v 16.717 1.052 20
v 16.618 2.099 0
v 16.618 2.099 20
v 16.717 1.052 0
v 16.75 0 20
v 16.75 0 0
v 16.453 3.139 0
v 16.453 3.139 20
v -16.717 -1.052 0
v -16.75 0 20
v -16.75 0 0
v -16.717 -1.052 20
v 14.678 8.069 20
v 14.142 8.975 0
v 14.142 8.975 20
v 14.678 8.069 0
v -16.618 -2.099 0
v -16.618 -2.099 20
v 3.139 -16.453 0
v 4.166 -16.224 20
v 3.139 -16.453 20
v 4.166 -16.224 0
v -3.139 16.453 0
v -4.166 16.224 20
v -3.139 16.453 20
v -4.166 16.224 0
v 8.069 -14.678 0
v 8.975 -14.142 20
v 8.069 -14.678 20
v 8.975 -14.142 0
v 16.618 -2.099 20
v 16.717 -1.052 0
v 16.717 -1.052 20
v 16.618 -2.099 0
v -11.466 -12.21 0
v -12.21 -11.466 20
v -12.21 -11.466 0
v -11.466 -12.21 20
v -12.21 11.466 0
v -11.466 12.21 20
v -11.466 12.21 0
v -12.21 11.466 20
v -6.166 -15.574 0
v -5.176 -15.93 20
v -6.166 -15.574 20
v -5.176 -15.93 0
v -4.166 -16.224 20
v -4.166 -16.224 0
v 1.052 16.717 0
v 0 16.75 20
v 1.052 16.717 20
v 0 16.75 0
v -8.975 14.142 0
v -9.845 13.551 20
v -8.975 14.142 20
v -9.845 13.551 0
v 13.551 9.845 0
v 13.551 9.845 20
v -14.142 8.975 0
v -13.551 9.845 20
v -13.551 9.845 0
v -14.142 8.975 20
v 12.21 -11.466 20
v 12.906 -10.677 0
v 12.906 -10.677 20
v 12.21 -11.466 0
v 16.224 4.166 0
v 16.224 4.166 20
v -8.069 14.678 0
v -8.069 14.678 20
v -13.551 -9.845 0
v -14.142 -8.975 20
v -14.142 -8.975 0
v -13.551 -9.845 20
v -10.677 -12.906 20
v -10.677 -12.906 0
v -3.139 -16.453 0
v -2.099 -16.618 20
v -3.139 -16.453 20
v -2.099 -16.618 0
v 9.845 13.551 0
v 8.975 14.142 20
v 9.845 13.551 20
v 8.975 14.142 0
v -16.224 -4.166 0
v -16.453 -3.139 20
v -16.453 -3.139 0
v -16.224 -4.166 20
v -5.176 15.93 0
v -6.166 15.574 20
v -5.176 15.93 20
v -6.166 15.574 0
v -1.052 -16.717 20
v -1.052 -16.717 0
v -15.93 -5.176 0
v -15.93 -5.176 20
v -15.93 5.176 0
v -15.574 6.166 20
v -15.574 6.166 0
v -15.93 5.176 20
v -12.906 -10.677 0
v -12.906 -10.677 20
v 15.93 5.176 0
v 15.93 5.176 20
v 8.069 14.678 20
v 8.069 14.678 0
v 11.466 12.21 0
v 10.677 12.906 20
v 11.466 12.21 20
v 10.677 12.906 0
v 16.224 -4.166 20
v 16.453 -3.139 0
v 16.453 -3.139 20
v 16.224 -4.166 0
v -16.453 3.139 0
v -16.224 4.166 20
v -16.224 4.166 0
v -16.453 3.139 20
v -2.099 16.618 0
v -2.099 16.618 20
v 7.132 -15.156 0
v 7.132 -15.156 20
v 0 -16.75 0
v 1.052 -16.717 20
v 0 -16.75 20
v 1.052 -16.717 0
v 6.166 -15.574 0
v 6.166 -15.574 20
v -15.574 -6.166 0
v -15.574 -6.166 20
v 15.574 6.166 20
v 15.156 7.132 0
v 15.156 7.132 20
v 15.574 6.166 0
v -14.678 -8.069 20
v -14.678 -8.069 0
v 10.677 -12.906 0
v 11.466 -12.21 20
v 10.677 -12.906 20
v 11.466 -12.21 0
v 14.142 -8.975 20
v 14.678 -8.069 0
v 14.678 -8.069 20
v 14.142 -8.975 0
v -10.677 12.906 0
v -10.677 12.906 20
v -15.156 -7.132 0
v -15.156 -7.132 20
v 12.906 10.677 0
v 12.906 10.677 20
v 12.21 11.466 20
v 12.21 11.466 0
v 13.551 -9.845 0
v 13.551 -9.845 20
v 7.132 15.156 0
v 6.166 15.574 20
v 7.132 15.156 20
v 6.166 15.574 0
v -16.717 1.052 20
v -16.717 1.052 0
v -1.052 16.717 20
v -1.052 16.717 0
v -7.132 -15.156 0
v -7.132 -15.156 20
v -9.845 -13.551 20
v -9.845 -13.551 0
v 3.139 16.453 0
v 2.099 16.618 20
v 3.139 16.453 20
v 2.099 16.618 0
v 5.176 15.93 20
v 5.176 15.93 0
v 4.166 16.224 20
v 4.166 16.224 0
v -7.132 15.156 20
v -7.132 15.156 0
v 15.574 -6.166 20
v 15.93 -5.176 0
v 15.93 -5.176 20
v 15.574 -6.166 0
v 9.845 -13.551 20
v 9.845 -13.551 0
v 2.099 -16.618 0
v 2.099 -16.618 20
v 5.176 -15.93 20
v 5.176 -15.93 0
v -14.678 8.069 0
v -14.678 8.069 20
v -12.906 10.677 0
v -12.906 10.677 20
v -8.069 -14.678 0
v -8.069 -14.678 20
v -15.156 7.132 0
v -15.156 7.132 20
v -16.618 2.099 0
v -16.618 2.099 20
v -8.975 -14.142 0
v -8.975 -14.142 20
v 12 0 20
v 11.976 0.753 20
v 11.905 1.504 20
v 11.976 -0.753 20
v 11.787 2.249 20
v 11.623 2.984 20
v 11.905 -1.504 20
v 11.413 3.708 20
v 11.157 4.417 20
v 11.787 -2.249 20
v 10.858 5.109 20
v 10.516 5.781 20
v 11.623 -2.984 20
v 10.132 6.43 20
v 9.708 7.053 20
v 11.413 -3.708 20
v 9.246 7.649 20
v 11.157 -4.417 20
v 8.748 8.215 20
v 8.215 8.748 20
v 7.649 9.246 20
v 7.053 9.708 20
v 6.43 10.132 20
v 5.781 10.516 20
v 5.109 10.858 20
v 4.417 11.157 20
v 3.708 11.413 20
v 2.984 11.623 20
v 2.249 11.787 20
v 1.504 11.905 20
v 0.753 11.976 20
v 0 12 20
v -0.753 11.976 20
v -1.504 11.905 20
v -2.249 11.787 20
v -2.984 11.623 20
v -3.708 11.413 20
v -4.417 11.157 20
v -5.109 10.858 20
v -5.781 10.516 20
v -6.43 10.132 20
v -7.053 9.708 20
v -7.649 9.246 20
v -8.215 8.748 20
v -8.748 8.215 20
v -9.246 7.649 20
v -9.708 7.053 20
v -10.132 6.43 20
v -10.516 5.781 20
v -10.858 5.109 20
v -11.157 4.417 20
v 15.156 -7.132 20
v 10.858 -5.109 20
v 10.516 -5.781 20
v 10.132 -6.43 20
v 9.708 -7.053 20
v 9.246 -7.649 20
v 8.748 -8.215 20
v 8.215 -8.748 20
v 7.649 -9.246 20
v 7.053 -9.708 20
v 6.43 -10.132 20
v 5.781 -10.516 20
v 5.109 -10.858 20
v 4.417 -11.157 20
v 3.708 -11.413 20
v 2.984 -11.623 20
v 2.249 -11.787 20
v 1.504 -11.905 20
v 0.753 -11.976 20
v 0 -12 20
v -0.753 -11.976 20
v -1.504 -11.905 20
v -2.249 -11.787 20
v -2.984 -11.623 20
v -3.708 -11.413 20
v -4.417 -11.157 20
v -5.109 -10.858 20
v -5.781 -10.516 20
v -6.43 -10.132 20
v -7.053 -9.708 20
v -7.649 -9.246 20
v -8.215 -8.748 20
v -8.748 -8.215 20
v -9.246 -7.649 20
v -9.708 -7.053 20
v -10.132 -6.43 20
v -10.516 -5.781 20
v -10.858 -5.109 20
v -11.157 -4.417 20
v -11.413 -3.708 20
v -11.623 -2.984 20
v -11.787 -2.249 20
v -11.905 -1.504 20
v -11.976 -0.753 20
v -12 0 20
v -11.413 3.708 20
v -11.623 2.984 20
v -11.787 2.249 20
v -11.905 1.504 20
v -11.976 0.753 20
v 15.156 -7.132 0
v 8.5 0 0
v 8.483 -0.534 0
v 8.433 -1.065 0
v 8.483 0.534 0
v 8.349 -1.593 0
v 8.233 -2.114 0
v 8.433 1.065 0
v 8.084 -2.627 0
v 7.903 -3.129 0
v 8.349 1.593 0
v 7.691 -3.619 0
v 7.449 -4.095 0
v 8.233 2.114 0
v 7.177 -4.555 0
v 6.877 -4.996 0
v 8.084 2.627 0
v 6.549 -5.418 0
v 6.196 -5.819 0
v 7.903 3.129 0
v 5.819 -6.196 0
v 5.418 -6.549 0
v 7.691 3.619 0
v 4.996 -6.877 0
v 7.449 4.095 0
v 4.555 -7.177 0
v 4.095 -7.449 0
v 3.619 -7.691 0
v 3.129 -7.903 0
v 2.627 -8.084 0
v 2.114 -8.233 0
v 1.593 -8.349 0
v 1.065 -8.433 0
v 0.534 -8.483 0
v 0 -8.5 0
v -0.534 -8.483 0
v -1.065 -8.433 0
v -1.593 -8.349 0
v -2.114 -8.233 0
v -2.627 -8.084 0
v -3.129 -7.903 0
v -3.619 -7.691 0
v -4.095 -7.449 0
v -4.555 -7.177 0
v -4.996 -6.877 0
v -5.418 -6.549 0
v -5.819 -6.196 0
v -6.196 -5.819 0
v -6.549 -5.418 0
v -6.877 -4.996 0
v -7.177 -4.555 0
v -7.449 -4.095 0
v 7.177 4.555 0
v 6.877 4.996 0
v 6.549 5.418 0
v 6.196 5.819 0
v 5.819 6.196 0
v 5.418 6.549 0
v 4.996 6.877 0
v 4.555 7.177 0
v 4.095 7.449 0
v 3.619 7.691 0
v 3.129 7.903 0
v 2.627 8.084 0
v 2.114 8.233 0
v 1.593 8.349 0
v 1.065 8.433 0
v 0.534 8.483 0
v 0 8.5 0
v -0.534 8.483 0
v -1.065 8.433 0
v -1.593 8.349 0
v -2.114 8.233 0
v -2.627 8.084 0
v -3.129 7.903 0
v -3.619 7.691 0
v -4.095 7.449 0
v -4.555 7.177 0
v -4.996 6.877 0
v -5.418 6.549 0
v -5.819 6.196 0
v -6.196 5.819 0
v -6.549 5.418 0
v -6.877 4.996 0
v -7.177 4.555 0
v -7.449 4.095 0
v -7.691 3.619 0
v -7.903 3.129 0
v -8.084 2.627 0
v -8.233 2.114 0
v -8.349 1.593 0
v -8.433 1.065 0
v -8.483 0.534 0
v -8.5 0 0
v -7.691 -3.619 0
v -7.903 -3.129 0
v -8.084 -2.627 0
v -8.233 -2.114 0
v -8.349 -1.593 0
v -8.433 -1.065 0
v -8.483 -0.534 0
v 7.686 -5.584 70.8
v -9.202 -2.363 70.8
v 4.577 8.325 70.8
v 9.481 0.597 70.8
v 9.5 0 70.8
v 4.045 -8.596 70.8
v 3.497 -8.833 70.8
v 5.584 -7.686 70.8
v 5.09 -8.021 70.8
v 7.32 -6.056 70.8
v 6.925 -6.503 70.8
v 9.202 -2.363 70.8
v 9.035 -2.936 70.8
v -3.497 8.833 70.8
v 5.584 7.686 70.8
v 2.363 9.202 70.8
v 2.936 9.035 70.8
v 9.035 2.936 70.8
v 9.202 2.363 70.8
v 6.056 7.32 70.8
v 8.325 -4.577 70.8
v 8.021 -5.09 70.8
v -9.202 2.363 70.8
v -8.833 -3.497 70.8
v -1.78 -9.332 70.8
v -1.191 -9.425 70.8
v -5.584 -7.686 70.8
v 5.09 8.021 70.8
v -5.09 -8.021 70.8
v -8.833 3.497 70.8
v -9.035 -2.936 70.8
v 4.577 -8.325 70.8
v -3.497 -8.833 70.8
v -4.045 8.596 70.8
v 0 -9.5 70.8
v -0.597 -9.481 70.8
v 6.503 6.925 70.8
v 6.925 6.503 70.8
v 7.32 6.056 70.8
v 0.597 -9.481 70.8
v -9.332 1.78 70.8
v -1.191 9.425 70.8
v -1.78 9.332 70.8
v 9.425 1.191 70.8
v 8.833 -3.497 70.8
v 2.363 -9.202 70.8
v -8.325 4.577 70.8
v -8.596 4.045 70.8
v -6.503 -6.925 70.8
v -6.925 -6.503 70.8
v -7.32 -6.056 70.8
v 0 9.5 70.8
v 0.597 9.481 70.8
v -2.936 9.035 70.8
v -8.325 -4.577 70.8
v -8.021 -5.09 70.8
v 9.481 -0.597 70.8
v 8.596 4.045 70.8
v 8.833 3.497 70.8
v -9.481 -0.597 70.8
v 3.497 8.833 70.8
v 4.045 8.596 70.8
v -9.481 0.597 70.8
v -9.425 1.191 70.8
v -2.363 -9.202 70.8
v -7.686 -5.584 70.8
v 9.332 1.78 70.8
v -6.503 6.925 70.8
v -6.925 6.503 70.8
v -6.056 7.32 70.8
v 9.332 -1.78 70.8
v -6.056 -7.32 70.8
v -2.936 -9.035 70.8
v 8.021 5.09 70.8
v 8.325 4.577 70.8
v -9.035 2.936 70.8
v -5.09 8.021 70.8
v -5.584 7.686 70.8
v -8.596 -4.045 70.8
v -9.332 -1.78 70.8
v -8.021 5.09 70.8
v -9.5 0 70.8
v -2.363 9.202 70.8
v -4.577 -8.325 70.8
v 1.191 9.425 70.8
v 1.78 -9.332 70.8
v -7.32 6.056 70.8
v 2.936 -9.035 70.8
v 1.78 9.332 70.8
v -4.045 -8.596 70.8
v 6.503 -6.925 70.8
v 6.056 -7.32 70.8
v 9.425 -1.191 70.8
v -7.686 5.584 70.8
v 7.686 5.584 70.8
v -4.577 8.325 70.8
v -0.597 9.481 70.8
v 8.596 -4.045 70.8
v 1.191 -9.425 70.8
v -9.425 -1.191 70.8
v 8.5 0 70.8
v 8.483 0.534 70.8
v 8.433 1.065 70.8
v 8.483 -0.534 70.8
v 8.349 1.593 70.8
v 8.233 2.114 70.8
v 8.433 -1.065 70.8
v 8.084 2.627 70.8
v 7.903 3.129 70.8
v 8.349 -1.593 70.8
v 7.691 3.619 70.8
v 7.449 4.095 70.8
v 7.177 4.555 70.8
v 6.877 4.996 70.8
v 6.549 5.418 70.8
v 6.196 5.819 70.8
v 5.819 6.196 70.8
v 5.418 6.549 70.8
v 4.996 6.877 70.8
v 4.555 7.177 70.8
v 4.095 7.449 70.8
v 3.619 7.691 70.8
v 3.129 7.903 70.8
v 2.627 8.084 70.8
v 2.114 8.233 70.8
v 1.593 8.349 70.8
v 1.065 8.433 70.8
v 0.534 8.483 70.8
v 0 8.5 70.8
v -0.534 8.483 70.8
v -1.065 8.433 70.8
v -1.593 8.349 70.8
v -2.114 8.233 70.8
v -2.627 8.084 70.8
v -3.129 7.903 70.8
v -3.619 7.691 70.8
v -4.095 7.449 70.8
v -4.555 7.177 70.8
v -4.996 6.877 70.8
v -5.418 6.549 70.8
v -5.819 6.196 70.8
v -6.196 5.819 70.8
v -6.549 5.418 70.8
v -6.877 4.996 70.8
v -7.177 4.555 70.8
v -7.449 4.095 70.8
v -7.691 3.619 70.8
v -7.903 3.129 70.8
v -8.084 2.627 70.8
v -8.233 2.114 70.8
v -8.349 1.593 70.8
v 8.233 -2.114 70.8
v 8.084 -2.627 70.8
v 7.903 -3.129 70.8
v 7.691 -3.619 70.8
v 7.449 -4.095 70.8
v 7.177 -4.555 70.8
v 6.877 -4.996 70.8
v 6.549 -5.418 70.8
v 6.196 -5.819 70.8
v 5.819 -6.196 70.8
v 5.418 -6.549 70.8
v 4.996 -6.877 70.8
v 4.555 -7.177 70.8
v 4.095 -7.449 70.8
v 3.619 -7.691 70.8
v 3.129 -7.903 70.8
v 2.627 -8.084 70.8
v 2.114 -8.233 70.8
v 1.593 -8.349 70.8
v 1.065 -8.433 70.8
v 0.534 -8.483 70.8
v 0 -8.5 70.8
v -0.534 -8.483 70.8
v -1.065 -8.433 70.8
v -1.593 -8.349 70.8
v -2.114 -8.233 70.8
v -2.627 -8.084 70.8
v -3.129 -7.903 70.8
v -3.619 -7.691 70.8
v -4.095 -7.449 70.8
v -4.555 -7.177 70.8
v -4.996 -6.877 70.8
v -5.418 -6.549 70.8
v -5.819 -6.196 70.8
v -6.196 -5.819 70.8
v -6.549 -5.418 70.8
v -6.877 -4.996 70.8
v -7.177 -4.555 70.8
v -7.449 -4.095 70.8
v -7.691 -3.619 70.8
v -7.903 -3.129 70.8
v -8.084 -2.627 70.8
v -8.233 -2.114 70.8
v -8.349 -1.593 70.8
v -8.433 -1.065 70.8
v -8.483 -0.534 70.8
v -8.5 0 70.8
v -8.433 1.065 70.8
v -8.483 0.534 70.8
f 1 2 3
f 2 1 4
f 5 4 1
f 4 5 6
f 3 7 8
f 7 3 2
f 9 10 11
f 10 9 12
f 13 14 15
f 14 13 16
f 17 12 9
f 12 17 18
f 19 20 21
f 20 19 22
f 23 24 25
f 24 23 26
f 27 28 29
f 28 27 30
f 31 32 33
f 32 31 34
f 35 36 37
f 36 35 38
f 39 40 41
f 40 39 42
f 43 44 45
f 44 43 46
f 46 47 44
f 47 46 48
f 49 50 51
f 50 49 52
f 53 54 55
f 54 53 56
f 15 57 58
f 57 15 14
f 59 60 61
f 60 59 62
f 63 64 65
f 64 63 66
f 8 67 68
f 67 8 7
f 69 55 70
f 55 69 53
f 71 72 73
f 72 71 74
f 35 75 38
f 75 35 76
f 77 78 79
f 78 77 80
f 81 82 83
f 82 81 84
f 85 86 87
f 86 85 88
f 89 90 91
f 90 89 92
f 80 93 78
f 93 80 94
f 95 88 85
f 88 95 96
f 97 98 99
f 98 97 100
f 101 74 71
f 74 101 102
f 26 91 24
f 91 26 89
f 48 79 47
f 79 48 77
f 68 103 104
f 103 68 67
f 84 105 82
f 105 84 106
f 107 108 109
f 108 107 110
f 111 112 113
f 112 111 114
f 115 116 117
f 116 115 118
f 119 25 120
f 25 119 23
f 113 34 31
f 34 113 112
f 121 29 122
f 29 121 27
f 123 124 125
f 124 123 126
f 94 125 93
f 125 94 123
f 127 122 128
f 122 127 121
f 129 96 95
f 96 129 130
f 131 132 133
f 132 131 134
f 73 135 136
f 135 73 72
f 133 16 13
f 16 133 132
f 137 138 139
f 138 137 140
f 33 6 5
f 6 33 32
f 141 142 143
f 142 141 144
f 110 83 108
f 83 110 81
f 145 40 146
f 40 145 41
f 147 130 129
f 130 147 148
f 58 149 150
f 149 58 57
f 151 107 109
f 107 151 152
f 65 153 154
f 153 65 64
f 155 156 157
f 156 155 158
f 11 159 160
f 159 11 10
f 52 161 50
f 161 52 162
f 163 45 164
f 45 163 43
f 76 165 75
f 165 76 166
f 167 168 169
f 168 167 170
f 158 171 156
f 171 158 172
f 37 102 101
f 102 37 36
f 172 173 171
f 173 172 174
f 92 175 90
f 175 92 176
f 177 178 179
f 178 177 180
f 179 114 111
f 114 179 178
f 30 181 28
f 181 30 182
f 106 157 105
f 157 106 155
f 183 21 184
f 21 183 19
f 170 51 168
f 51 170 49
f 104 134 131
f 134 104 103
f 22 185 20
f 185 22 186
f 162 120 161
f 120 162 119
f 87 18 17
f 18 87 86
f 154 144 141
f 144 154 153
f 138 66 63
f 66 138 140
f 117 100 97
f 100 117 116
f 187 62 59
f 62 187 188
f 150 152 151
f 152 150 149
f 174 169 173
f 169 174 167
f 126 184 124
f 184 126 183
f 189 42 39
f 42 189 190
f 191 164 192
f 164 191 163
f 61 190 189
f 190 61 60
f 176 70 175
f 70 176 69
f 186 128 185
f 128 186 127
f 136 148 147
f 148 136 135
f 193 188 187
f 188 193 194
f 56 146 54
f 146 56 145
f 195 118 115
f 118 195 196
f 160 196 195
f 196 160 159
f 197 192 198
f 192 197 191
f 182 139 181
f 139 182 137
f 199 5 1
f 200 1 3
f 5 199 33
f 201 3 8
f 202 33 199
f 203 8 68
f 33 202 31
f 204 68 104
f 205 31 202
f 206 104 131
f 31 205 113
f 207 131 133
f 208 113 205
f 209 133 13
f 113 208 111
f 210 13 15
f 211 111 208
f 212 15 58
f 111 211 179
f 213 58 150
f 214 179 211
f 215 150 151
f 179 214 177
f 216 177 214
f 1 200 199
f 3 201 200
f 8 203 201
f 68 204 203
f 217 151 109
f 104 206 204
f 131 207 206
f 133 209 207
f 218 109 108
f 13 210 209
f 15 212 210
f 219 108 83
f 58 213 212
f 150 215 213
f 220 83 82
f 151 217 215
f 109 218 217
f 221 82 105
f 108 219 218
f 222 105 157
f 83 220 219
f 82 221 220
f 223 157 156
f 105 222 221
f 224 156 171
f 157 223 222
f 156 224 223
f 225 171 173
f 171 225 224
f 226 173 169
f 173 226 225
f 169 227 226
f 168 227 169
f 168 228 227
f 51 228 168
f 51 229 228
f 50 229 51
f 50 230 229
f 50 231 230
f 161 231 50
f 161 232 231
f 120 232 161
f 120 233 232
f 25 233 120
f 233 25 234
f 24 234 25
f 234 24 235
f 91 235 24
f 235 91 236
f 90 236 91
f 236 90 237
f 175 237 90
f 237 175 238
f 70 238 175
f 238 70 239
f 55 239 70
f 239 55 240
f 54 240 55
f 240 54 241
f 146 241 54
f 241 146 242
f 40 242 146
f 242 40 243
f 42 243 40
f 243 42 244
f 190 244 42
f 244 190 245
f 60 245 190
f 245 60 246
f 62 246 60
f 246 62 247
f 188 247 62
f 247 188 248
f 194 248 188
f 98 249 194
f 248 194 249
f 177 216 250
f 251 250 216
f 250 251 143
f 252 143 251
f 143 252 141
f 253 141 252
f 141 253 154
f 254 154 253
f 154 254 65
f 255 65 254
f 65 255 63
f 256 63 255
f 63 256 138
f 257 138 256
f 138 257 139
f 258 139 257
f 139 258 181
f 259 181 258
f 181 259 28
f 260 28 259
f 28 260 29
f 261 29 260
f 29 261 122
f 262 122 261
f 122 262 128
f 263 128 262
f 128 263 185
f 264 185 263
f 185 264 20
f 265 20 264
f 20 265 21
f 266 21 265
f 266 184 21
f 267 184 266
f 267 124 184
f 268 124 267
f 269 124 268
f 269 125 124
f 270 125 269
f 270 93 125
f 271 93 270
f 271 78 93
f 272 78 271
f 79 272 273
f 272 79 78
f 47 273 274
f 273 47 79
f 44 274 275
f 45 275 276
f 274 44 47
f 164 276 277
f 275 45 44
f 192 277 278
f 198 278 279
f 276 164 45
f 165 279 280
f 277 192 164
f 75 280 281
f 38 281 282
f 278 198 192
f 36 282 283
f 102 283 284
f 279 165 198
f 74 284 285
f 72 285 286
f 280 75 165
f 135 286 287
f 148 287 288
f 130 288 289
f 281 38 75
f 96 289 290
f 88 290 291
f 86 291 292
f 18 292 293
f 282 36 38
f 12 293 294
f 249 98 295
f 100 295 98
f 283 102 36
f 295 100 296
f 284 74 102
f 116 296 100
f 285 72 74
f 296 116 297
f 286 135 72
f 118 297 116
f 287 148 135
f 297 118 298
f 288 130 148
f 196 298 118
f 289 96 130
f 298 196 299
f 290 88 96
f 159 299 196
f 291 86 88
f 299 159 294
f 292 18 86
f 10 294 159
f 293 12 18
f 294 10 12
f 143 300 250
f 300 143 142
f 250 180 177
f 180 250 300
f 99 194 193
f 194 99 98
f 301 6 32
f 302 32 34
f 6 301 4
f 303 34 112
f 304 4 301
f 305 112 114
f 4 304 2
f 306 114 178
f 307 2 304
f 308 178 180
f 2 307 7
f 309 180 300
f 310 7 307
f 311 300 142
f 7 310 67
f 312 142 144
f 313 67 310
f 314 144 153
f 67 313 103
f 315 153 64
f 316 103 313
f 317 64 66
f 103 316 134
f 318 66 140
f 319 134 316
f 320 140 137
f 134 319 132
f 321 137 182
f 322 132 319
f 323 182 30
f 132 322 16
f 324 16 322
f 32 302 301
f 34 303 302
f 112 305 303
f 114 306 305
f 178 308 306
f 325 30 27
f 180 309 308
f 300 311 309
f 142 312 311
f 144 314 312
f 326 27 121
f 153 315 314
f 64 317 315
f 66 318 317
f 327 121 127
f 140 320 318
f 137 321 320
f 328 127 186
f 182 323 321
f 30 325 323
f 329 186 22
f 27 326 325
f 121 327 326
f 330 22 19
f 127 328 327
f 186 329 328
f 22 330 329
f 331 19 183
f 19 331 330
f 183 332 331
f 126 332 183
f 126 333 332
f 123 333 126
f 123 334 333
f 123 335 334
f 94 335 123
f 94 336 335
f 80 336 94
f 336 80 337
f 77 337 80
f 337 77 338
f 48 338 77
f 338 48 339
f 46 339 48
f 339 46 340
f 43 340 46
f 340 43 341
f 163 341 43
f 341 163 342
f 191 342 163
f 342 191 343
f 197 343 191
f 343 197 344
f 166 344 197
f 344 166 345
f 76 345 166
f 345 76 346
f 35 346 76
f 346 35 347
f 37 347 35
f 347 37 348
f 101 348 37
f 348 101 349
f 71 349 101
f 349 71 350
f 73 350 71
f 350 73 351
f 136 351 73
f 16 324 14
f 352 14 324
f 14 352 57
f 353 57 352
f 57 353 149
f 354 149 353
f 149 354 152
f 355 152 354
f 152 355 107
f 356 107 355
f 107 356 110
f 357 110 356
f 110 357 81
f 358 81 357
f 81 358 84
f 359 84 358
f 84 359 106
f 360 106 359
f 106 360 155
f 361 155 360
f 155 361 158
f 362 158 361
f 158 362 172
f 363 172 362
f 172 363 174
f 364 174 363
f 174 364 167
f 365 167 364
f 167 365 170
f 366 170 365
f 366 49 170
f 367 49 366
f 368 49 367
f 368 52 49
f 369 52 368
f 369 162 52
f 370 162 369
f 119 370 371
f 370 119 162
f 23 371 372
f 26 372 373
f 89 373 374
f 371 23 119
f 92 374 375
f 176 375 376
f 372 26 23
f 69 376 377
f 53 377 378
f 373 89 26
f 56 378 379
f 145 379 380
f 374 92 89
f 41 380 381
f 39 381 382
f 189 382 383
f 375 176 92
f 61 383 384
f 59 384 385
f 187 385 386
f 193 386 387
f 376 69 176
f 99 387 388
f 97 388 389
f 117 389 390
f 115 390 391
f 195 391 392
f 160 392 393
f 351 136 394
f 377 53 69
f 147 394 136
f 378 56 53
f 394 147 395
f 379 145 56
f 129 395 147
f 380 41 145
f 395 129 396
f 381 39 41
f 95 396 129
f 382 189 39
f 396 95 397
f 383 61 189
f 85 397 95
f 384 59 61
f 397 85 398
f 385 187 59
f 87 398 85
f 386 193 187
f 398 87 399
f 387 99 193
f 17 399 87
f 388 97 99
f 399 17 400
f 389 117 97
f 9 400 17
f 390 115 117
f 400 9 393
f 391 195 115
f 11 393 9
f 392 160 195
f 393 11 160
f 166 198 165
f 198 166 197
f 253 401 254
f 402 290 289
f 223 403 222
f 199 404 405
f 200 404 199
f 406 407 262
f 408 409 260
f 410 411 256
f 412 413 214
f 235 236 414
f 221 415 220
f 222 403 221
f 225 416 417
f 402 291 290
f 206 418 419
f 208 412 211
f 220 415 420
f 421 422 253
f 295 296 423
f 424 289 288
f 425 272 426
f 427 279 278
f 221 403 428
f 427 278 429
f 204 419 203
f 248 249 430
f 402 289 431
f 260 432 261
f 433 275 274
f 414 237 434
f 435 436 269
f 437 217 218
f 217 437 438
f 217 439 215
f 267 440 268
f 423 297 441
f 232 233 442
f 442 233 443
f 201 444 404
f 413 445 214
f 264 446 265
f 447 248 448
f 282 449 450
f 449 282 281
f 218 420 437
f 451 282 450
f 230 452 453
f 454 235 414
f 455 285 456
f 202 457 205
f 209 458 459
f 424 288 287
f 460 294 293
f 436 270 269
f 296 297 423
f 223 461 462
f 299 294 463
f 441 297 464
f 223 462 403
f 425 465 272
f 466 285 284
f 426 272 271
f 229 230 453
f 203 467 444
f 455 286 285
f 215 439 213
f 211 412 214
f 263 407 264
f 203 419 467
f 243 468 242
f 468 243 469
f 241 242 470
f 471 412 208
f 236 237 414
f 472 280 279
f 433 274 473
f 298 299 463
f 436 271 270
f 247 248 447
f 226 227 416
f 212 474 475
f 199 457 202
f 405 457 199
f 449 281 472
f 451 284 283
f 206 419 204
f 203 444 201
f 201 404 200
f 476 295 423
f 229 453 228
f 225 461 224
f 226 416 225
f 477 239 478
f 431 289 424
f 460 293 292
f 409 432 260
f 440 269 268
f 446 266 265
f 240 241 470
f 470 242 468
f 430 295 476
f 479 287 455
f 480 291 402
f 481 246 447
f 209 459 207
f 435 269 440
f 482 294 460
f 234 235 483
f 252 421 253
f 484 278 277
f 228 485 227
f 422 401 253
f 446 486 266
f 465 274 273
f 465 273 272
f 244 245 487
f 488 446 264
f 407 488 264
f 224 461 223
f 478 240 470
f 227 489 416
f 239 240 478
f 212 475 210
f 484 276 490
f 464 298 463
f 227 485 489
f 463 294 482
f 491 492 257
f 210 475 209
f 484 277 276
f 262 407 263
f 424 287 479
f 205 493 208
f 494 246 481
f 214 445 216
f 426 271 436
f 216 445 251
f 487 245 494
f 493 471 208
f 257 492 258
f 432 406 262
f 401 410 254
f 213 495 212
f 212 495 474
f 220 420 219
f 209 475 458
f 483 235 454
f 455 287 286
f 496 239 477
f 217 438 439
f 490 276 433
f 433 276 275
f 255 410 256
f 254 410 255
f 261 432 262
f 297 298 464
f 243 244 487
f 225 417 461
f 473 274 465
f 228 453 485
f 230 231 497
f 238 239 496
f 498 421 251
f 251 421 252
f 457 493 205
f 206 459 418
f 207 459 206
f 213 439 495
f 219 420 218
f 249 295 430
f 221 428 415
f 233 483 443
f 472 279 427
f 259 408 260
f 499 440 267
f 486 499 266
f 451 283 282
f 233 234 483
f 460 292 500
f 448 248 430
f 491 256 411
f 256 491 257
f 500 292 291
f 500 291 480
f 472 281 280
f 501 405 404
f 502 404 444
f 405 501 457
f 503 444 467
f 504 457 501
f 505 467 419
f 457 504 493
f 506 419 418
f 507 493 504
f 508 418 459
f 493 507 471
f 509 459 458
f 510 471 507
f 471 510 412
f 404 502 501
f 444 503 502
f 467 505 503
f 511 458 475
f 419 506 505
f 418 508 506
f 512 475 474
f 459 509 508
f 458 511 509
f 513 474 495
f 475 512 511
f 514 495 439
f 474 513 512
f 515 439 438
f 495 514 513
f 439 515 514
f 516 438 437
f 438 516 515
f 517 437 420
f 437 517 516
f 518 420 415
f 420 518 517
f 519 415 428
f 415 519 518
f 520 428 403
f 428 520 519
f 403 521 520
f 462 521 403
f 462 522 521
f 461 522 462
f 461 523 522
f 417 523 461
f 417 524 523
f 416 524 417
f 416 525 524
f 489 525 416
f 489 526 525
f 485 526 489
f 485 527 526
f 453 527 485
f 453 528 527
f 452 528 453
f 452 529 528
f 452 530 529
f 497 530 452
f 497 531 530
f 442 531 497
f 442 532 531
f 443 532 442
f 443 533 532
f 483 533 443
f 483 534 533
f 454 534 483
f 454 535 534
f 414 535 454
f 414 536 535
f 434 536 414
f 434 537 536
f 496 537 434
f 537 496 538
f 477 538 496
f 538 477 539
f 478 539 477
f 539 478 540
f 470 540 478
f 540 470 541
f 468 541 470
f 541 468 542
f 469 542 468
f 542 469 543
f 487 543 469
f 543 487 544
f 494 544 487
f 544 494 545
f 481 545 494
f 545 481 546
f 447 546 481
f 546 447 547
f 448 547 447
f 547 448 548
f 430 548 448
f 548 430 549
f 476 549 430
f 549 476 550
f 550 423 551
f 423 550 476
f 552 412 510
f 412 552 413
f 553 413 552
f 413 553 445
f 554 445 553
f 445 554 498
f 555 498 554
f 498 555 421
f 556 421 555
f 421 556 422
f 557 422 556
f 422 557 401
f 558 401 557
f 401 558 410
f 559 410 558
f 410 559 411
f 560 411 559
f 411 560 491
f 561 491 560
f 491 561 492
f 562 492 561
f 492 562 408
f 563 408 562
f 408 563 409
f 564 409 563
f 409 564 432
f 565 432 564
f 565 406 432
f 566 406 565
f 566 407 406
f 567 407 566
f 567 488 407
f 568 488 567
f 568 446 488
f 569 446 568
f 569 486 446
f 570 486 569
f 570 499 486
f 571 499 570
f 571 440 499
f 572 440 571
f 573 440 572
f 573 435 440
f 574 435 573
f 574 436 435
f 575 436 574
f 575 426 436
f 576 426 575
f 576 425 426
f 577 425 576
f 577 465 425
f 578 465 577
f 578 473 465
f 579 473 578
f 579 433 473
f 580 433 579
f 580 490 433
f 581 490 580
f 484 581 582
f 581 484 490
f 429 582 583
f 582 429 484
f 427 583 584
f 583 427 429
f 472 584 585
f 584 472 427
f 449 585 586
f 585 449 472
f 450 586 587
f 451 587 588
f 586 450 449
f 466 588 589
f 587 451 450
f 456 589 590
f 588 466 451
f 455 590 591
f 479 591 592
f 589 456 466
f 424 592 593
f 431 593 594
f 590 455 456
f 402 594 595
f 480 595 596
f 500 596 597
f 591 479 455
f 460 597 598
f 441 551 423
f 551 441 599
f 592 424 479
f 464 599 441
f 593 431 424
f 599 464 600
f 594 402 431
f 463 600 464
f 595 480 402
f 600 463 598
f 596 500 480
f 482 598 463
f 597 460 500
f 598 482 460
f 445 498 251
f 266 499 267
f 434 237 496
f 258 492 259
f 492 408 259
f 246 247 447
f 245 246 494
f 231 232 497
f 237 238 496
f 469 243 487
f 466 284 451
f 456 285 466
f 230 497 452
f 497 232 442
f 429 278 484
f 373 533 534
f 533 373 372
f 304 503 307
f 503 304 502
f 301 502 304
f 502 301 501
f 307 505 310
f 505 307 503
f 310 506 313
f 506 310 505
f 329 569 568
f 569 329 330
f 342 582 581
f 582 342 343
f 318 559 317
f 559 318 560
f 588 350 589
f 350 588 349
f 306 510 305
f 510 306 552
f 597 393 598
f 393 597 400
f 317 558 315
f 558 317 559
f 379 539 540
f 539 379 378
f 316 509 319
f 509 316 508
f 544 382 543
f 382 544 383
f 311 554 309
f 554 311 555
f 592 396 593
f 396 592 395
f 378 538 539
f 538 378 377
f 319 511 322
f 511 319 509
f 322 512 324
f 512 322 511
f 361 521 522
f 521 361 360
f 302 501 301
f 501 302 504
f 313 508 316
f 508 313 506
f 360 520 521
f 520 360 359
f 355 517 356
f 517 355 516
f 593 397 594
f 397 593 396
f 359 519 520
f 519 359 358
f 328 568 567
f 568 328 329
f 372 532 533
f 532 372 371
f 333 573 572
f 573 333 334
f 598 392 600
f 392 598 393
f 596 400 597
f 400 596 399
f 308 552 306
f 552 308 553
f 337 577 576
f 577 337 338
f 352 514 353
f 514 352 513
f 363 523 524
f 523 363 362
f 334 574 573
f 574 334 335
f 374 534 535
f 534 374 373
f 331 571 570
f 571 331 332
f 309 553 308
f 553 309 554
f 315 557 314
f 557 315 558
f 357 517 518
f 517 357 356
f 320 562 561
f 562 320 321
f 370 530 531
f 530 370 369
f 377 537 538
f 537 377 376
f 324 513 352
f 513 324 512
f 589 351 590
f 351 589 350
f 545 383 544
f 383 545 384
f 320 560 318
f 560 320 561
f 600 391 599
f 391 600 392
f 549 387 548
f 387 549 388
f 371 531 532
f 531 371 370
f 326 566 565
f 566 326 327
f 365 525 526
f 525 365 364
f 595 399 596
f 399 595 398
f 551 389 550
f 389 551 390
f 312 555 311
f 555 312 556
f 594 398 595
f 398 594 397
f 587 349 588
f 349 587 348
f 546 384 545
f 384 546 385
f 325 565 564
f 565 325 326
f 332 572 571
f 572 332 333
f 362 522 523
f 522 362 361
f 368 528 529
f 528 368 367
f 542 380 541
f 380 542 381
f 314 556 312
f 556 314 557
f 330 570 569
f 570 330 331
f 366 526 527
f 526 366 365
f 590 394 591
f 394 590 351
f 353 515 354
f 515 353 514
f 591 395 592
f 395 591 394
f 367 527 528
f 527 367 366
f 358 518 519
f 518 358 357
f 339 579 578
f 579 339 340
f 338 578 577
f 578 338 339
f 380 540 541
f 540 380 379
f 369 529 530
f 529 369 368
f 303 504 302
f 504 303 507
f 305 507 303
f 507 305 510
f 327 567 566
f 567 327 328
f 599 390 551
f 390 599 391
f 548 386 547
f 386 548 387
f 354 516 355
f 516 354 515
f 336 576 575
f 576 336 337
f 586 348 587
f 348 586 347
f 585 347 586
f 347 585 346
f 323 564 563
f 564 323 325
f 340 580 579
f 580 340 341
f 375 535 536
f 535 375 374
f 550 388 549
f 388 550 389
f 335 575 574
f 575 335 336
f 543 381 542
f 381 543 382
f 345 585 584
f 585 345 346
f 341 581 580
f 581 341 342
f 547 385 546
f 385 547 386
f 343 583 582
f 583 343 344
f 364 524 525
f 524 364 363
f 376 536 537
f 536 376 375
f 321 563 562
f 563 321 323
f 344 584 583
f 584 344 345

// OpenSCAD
_fn=100;

difference(){
    union(){
        cylinder(h=20, r1=33.5/2, r2=33.5/2,$fn=_fn);
        translate([0,0,20]){
            color("red")
            cylinder(h=25.4*2, r1=24/2, r2=19/2,$fn=_fn);
        }
    }


    translate([0,0,-.1]){
        color("green")
        cylinder(h=25.4*3, r1=19/2-1, r2=19/2-1,$fn=_fn);
    }
}
